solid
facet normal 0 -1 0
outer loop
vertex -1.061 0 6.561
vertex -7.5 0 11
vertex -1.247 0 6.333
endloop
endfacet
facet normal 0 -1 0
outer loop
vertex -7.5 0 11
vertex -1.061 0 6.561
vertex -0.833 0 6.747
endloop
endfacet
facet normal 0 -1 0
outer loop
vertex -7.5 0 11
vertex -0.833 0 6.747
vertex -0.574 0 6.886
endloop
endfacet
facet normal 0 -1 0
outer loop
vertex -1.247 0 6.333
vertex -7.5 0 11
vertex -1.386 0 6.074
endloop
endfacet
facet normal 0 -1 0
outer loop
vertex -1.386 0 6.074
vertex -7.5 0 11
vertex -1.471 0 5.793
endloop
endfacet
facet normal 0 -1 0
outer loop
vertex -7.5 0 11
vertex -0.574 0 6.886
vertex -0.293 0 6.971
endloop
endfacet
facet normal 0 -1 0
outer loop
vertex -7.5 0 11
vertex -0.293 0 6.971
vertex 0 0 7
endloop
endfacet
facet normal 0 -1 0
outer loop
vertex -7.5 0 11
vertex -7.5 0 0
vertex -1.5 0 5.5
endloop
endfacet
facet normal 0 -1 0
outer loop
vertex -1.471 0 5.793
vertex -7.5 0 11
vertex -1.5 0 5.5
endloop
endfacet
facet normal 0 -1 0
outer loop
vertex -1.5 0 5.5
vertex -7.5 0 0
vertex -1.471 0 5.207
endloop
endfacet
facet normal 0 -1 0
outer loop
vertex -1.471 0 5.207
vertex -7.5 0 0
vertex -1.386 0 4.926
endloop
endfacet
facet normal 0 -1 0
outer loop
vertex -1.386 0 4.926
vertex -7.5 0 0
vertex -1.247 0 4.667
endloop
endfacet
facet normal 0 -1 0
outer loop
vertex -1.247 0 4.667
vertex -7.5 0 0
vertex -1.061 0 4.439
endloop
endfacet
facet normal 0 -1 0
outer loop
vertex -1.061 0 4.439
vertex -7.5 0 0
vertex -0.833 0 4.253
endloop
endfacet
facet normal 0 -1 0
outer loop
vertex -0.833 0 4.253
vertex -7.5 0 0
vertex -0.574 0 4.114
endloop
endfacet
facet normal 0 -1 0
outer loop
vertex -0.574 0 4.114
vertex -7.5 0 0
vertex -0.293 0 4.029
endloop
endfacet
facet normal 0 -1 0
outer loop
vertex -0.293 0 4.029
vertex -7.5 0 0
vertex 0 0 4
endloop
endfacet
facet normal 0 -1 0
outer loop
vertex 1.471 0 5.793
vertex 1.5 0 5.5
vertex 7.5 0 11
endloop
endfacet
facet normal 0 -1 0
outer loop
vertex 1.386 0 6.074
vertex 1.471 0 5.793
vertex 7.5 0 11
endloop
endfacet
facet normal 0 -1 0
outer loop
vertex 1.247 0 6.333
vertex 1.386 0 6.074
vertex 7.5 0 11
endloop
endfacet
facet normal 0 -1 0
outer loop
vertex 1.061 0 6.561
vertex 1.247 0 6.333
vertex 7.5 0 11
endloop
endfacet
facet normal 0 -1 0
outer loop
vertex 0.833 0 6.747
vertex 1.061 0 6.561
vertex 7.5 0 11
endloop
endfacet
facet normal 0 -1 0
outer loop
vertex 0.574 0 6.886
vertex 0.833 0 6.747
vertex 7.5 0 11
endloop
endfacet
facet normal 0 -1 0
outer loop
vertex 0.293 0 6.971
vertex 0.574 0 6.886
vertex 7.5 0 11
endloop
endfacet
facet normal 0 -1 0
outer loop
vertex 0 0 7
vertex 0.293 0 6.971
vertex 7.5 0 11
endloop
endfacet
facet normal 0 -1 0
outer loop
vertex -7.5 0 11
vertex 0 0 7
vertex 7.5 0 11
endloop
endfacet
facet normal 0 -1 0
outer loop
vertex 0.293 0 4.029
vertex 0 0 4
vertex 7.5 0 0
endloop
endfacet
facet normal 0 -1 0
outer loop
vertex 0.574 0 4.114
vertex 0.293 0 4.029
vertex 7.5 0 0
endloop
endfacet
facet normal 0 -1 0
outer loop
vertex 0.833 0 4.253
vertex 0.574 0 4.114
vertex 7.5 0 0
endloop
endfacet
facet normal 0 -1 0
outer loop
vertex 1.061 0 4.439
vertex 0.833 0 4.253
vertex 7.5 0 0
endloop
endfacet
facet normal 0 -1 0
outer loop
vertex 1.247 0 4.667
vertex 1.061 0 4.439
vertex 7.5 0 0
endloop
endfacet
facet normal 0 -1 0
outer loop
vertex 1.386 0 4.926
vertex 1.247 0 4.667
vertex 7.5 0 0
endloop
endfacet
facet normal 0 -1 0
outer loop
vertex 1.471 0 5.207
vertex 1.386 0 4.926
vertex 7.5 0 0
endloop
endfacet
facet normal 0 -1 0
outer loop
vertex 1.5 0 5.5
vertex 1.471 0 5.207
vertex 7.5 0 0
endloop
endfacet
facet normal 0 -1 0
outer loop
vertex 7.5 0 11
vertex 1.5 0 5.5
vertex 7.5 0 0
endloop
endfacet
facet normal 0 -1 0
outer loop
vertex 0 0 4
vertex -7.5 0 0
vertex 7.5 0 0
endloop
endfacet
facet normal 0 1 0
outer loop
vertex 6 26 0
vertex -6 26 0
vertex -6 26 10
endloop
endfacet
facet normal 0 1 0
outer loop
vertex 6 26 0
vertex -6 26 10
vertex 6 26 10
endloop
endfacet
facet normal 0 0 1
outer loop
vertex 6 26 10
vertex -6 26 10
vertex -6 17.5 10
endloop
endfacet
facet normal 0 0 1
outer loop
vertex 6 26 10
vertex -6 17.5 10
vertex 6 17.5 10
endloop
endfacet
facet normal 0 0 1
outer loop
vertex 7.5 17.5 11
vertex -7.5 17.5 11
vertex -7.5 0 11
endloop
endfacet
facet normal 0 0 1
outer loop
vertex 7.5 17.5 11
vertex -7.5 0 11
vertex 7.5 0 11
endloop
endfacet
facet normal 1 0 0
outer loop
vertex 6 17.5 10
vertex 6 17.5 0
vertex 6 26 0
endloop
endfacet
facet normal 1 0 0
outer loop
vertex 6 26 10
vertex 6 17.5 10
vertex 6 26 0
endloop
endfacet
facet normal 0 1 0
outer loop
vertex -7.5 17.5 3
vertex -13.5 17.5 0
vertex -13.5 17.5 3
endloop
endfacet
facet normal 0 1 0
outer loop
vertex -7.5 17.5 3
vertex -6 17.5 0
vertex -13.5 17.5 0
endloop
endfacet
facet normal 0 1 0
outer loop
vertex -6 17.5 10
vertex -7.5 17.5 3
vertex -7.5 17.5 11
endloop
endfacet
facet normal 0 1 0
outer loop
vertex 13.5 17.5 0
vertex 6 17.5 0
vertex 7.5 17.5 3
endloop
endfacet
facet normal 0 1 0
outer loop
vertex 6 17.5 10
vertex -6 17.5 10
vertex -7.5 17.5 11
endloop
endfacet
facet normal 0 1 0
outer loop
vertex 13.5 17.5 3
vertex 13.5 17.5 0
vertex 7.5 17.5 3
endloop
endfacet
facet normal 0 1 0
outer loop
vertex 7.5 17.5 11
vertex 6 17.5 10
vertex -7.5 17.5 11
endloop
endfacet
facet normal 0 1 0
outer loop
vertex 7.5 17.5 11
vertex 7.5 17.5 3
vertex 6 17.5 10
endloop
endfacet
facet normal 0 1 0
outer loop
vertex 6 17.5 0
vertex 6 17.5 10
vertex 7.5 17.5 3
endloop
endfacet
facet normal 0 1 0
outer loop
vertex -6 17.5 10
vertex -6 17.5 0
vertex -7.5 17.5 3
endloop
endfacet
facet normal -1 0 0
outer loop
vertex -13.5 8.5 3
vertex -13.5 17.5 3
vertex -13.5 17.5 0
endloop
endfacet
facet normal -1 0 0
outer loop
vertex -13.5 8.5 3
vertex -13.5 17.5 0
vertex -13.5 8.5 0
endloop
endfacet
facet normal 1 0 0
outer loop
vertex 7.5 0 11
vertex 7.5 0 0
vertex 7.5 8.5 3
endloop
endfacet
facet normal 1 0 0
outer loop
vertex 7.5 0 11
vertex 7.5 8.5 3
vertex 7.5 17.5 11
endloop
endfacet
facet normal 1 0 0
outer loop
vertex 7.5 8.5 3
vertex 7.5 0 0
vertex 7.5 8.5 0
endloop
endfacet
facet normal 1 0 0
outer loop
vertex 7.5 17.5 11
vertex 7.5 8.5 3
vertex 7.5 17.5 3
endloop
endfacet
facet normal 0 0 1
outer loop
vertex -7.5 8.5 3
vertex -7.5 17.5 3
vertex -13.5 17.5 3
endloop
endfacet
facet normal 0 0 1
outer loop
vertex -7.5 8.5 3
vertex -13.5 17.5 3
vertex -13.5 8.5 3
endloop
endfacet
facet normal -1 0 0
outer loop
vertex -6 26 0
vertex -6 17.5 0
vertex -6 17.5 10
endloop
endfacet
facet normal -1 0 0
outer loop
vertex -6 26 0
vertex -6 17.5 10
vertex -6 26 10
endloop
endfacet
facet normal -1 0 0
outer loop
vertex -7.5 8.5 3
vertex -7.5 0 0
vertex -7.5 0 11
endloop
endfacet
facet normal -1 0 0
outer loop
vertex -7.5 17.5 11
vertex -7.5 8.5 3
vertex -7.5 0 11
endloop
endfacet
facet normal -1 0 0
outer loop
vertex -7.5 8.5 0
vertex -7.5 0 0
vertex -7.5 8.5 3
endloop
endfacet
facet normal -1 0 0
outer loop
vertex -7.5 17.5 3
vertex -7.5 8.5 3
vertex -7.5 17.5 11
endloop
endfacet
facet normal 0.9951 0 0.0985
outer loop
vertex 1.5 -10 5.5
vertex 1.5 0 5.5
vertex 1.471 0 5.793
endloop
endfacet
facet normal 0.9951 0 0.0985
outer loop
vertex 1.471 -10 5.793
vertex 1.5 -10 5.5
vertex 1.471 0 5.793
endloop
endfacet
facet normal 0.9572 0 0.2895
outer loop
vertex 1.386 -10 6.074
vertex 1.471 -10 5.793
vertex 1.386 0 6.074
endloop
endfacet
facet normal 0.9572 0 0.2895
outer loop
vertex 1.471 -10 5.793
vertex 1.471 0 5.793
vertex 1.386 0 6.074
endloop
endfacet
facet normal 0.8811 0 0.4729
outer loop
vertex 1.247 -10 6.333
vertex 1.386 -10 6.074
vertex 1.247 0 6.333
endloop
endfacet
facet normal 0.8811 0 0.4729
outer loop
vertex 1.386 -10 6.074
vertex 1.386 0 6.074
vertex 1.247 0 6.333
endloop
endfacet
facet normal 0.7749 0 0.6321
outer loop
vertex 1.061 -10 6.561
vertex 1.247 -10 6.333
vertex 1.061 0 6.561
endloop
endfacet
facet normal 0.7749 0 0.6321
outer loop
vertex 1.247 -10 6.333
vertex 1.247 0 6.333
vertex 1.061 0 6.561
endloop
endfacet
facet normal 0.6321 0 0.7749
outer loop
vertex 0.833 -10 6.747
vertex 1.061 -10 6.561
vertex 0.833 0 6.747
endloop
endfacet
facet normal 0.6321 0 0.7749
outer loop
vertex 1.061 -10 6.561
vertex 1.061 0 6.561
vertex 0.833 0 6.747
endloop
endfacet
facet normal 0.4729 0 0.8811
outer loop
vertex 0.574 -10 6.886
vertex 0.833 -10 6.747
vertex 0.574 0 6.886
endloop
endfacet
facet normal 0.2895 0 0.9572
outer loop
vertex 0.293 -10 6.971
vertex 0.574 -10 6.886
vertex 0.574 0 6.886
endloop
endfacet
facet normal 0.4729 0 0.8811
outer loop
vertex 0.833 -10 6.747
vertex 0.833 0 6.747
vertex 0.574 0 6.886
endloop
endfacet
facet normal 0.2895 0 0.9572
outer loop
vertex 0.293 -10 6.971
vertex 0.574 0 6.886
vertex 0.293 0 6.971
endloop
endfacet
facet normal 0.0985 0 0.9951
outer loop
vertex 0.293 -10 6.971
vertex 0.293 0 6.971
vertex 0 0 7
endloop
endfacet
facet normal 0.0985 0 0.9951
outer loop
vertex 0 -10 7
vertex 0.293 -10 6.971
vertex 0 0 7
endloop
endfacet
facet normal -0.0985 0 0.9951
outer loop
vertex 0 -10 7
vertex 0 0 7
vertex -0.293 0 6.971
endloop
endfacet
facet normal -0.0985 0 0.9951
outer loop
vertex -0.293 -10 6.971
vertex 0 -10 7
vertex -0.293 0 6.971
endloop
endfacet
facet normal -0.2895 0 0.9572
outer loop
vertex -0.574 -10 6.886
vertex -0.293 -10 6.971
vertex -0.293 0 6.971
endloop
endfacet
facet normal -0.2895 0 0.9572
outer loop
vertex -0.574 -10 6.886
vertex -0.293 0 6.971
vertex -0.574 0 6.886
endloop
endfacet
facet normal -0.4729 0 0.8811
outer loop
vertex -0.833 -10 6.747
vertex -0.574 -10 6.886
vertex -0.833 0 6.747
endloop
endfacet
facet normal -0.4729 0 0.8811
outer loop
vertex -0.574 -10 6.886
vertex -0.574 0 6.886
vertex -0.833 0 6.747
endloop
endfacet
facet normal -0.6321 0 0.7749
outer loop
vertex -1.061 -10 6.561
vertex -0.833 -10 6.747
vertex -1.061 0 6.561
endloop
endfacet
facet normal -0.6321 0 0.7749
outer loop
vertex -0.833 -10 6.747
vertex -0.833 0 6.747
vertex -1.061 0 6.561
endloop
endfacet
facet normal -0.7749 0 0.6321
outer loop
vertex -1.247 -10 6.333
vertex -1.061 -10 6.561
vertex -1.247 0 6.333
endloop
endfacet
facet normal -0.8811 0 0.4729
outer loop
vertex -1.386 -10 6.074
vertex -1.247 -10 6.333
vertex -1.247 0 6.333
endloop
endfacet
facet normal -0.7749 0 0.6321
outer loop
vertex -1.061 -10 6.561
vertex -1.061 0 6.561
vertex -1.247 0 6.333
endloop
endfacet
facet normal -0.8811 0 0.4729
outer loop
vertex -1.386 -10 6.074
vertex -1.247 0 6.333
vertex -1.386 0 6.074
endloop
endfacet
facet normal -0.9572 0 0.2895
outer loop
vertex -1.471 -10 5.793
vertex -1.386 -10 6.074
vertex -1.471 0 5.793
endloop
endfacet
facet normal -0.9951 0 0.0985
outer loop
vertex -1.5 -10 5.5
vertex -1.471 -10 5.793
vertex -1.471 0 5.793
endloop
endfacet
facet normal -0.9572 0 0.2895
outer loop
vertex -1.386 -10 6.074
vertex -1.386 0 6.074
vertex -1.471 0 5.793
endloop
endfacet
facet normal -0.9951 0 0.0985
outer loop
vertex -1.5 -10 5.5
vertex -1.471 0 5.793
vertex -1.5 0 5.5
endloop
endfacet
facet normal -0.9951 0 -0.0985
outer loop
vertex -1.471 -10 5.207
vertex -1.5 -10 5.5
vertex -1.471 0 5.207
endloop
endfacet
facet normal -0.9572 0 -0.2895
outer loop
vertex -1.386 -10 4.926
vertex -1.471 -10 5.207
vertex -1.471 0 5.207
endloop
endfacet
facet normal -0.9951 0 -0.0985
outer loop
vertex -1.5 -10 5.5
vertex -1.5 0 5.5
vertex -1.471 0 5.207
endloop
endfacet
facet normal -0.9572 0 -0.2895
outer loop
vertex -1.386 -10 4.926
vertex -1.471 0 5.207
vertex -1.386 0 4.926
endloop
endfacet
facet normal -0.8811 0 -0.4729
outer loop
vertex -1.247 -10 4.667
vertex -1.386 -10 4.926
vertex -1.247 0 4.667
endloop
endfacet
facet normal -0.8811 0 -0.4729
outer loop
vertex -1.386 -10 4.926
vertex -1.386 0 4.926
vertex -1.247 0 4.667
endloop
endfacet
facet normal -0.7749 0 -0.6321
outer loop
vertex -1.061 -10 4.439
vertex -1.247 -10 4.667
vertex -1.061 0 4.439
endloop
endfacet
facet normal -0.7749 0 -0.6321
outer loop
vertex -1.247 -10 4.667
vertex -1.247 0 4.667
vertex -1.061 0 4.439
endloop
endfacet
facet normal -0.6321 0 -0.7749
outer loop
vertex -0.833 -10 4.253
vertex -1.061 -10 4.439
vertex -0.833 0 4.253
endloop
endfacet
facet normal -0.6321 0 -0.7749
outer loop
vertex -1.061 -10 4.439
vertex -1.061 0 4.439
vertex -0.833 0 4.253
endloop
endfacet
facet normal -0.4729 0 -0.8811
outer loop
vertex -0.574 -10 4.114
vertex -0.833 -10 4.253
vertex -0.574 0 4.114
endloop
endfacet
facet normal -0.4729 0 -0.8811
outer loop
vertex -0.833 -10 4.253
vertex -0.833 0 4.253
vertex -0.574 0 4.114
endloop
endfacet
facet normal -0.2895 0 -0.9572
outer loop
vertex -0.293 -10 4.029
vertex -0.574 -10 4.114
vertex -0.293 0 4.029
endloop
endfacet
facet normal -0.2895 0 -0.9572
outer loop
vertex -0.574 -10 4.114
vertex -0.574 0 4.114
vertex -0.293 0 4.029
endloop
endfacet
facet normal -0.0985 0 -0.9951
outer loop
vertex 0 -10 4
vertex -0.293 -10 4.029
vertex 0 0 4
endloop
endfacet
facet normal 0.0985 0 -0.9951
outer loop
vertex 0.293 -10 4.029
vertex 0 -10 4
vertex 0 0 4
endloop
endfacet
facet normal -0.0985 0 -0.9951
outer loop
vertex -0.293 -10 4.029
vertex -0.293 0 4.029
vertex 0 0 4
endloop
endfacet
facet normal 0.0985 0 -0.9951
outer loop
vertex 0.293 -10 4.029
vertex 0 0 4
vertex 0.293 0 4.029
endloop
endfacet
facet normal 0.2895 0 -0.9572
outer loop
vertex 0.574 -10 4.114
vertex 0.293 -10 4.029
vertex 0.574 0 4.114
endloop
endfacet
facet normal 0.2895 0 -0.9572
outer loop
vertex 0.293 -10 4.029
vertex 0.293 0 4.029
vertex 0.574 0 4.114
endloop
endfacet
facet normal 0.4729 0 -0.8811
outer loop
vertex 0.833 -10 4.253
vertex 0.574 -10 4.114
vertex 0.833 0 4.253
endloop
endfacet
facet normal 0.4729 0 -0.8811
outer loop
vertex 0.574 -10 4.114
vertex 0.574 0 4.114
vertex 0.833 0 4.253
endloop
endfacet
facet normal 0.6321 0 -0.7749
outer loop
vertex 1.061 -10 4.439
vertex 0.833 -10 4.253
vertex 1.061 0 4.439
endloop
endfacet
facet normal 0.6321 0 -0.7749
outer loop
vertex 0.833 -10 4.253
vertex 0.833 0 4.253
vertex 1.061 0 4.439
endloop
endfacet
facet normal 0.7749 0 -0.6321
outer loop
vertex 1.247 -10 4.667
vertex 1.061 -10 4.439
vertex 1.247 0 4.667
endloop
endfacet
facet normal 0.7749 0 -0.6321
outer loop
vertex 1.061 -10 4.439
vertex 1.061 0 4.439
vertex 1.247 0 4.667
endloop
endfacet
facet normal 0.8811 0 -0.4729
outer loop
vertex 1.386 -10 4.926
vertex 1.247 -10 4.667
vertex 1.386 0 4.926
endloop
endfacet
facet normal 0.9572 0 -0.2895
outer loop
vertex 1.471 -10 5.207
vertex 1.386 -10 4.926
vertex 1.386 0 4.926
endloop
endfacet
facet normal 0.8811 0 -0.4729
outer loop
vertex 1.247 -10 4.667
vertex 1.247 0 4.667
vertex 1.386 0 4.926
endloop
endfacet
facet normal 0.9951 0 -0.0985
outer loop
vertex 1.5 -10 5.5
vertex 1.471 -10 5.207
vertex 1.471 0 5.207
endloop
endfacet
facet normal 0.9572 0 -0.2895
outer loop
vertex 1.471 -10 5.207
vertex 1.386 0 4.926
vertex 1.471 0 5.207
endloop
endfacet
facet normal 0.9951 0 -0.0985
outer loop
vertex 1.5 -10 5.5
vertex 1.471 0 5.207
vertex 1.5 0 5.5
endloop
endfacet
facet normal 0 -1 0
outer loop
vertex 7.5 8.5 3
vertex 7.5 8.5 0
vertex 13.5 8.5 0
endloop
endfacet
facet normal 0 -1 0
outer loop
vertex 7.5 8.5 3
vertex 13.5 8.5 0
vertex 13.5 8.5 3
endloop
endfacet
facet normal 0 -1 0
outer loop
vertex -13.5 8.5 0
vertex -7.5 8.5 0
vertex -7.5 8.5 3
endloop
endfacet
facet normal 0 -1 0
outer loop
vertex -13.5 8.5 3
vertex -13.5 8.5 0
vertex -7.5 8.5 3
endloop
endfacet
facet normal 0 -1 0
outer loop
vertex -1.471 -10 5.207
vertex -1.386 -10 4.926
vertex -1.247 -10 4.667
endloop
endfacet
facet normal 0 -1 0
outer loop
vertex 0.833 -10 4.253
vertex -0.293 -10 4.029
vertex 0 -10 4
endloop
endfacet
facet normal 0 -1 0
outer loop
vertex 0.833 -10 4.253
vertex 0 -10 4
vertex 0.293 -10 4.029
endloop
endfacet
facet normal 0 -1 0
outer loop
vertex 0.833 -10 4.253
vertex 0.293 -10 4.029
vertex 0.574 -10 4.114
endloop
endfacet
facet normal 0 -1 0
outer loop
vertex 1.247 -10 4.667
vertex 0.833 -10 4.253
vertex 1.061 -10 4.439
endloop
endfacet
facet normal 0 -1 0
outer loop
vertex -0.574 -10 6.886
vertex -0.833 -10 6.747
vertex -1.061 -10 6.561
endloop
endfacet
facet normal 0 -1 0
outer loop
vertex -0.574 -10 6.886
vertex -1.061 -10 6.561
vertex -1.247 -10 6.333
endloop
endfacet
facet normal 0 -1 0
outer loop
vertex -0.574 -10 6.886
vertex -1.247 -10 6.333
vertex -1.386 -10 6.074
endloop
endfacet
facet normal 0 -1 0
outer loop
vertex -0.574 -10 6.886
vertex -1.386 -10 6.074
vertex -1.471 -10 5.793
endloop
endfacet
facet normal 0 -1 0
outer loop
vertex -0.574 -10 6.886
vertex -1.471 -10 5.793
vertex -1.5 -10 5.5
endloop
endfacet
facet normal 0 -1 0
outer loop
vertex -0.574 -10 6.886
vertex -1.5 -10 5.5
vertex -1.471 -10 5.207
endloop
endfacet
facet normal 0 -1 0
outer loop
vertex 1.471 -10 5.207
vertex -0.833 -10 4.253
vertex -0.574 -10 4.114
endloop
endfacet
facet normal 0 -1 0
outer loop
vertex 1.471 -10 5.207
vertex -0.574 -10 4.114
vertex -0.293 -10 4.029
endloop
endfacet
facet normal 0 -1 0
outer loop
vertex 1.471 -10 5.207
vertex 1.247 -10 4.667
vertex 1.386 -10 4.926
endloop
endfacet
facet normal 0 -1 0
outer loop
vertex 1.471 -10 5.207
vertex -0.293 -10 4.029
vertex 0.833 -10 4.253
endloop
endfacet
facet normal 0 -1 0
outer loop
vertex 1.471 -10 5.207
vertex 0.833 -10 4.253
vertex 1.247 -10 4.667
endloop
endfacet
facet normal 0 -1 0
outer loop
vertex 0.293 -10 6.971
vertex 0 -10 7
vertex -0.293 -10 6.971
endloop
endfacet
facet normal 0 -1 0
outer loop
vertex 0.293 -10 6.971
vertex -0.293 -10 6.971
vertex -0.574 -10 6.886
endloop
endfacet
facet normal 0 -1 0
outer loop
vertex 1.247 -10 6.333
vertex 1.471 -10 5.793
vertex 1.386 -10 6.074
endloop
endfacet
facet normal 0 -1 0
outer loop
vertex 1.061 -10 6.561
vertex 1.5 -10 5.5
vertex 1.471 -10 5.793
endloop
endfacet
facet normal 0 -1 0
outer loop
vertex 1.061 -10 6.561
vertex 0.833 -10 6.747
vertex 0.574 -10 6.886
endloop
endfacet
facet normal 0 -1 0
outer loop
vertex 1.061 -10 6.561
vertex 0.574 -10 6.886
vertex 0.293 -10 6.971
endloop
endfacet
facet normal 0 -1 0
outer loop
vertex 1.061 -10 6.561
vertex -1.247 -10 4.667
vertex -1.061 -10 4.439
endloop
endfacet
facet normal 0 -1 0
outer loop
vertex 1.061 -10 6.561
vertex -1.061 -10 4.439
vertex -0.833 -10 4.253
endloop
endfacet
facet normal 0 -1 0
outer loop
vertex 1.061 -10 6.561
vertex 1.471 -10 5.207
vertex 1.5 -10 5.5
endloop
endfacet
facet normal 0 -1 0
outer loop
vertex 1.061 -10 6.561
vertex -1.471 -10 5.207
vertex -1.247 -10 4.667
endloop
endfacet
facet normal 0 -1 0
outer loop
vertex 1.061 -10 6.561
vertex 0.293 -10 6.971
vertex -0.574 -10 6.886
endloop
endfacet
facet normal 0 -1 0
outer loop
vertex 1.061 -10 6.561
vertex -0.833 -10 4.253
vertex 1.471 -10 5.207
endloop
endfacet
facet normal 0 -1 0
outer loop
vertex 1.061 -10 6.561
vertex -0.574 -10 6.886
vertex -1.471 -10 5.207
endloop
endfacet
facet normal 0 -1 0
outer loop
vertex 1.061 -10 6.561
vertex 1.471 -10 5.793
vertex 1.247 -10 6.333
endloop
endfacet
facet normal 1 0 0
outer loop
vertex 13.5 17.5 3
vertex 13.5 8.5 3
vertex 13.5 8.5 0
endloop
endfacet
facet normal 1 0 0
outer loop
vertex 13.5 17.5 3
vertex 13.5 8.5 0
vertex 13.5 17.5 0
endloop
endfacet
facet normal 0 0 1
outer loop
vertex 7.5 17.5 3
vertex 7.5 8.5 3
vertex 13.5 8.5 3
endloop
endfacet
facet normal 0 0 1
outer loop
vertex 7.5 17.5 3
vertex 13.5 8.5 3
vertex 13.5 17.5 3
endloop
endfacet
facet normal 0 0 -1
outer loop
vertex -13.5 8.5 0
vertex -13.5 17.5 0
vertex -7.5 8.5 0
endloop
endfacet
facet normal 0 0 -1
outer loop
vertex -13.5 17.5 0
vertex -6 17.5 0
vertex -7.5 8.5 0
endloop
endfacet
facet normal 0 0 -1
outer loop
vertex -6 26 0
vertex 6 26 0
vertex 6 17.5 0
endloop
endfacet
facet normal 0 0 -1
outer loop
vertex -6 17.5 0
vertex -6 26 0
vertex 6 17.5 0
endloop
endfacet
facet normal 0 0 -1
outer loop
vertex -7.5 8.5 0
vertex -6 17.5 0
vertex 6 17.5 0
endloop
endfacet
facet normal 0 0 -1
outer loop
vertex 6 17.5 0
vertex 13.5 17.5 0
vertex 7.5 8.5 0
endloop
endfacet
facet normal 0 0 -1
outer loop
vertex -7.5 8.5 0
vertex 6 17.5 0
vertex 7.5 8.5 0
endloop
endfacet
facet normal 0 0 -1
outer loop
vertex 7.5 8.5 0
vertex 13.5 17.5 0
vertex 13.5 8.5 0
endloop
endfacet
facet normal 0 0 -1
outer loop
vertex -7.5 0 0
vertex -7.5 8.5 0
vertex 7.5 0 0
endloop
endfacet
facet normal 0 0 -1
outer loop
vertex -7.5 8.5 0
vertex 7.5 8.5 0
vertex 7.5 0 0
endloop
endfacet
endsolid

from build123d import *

# Parameters (mm, degrees)
F0_W     = 12
F0_H     = 26
F1_DEPTH = 10
F2_W     = 15
F2_H     = 17.5
F3_DEPTH = 11
F4_W     = 9
F4_H     = 3
F5_DEPTH = 6
F6_W     = 9
F6_H     = 3
F7_DEPTH = 6
F8_R     = 1.5
F9_DEPTH = 10


# Not quite as in the source:
# - a feature names something its author has since deleted; it is built from what else it names


with BuildPart() as f1:
    # F0 (on Top) → F1 (new body)
    with BuildSketch(Plane.XY):
        with Locations((0, 13)):
            Rectangle(F0_W, F0_H)
    extrude(amount=F1_DEPTH)

    # F2 (on Top) → F3 (join)
    with BuildSketch(Plane.XY):
        with Locations((0, 8.75)):
            Rectangle(F2_W, F2_H)
    extrude(amount=F3_DEPTH)

    # F4 (on face) → F5 (join)
    with BuildSketch(Plane.YZ.offset(7.5)):
        with Locations((13, 1.5)):
            Rectangle(F4_W, F4_H)
    extrude(amount=F5_DEPTH)

    # F6 (on face) → F7 (join)
    with BuildSketch(Plane(origin=(-7.5, 0, 0), x_dir=(0, -1, 0), z_dir=(-1, 0, 0))):
        with Locations((-13, 1.5)):
            Rectangle(F6_W, F6_H)
    extrude(amount=F7_DEPTH)

    # F8 (on face) → F9 (join)
    with BuildSketch(Plane.XZ):
        with Locations((0, 5.5)):
            Circle(F8_R)
    extrude(amount=F9_DEPTH)


solid = f1.part
